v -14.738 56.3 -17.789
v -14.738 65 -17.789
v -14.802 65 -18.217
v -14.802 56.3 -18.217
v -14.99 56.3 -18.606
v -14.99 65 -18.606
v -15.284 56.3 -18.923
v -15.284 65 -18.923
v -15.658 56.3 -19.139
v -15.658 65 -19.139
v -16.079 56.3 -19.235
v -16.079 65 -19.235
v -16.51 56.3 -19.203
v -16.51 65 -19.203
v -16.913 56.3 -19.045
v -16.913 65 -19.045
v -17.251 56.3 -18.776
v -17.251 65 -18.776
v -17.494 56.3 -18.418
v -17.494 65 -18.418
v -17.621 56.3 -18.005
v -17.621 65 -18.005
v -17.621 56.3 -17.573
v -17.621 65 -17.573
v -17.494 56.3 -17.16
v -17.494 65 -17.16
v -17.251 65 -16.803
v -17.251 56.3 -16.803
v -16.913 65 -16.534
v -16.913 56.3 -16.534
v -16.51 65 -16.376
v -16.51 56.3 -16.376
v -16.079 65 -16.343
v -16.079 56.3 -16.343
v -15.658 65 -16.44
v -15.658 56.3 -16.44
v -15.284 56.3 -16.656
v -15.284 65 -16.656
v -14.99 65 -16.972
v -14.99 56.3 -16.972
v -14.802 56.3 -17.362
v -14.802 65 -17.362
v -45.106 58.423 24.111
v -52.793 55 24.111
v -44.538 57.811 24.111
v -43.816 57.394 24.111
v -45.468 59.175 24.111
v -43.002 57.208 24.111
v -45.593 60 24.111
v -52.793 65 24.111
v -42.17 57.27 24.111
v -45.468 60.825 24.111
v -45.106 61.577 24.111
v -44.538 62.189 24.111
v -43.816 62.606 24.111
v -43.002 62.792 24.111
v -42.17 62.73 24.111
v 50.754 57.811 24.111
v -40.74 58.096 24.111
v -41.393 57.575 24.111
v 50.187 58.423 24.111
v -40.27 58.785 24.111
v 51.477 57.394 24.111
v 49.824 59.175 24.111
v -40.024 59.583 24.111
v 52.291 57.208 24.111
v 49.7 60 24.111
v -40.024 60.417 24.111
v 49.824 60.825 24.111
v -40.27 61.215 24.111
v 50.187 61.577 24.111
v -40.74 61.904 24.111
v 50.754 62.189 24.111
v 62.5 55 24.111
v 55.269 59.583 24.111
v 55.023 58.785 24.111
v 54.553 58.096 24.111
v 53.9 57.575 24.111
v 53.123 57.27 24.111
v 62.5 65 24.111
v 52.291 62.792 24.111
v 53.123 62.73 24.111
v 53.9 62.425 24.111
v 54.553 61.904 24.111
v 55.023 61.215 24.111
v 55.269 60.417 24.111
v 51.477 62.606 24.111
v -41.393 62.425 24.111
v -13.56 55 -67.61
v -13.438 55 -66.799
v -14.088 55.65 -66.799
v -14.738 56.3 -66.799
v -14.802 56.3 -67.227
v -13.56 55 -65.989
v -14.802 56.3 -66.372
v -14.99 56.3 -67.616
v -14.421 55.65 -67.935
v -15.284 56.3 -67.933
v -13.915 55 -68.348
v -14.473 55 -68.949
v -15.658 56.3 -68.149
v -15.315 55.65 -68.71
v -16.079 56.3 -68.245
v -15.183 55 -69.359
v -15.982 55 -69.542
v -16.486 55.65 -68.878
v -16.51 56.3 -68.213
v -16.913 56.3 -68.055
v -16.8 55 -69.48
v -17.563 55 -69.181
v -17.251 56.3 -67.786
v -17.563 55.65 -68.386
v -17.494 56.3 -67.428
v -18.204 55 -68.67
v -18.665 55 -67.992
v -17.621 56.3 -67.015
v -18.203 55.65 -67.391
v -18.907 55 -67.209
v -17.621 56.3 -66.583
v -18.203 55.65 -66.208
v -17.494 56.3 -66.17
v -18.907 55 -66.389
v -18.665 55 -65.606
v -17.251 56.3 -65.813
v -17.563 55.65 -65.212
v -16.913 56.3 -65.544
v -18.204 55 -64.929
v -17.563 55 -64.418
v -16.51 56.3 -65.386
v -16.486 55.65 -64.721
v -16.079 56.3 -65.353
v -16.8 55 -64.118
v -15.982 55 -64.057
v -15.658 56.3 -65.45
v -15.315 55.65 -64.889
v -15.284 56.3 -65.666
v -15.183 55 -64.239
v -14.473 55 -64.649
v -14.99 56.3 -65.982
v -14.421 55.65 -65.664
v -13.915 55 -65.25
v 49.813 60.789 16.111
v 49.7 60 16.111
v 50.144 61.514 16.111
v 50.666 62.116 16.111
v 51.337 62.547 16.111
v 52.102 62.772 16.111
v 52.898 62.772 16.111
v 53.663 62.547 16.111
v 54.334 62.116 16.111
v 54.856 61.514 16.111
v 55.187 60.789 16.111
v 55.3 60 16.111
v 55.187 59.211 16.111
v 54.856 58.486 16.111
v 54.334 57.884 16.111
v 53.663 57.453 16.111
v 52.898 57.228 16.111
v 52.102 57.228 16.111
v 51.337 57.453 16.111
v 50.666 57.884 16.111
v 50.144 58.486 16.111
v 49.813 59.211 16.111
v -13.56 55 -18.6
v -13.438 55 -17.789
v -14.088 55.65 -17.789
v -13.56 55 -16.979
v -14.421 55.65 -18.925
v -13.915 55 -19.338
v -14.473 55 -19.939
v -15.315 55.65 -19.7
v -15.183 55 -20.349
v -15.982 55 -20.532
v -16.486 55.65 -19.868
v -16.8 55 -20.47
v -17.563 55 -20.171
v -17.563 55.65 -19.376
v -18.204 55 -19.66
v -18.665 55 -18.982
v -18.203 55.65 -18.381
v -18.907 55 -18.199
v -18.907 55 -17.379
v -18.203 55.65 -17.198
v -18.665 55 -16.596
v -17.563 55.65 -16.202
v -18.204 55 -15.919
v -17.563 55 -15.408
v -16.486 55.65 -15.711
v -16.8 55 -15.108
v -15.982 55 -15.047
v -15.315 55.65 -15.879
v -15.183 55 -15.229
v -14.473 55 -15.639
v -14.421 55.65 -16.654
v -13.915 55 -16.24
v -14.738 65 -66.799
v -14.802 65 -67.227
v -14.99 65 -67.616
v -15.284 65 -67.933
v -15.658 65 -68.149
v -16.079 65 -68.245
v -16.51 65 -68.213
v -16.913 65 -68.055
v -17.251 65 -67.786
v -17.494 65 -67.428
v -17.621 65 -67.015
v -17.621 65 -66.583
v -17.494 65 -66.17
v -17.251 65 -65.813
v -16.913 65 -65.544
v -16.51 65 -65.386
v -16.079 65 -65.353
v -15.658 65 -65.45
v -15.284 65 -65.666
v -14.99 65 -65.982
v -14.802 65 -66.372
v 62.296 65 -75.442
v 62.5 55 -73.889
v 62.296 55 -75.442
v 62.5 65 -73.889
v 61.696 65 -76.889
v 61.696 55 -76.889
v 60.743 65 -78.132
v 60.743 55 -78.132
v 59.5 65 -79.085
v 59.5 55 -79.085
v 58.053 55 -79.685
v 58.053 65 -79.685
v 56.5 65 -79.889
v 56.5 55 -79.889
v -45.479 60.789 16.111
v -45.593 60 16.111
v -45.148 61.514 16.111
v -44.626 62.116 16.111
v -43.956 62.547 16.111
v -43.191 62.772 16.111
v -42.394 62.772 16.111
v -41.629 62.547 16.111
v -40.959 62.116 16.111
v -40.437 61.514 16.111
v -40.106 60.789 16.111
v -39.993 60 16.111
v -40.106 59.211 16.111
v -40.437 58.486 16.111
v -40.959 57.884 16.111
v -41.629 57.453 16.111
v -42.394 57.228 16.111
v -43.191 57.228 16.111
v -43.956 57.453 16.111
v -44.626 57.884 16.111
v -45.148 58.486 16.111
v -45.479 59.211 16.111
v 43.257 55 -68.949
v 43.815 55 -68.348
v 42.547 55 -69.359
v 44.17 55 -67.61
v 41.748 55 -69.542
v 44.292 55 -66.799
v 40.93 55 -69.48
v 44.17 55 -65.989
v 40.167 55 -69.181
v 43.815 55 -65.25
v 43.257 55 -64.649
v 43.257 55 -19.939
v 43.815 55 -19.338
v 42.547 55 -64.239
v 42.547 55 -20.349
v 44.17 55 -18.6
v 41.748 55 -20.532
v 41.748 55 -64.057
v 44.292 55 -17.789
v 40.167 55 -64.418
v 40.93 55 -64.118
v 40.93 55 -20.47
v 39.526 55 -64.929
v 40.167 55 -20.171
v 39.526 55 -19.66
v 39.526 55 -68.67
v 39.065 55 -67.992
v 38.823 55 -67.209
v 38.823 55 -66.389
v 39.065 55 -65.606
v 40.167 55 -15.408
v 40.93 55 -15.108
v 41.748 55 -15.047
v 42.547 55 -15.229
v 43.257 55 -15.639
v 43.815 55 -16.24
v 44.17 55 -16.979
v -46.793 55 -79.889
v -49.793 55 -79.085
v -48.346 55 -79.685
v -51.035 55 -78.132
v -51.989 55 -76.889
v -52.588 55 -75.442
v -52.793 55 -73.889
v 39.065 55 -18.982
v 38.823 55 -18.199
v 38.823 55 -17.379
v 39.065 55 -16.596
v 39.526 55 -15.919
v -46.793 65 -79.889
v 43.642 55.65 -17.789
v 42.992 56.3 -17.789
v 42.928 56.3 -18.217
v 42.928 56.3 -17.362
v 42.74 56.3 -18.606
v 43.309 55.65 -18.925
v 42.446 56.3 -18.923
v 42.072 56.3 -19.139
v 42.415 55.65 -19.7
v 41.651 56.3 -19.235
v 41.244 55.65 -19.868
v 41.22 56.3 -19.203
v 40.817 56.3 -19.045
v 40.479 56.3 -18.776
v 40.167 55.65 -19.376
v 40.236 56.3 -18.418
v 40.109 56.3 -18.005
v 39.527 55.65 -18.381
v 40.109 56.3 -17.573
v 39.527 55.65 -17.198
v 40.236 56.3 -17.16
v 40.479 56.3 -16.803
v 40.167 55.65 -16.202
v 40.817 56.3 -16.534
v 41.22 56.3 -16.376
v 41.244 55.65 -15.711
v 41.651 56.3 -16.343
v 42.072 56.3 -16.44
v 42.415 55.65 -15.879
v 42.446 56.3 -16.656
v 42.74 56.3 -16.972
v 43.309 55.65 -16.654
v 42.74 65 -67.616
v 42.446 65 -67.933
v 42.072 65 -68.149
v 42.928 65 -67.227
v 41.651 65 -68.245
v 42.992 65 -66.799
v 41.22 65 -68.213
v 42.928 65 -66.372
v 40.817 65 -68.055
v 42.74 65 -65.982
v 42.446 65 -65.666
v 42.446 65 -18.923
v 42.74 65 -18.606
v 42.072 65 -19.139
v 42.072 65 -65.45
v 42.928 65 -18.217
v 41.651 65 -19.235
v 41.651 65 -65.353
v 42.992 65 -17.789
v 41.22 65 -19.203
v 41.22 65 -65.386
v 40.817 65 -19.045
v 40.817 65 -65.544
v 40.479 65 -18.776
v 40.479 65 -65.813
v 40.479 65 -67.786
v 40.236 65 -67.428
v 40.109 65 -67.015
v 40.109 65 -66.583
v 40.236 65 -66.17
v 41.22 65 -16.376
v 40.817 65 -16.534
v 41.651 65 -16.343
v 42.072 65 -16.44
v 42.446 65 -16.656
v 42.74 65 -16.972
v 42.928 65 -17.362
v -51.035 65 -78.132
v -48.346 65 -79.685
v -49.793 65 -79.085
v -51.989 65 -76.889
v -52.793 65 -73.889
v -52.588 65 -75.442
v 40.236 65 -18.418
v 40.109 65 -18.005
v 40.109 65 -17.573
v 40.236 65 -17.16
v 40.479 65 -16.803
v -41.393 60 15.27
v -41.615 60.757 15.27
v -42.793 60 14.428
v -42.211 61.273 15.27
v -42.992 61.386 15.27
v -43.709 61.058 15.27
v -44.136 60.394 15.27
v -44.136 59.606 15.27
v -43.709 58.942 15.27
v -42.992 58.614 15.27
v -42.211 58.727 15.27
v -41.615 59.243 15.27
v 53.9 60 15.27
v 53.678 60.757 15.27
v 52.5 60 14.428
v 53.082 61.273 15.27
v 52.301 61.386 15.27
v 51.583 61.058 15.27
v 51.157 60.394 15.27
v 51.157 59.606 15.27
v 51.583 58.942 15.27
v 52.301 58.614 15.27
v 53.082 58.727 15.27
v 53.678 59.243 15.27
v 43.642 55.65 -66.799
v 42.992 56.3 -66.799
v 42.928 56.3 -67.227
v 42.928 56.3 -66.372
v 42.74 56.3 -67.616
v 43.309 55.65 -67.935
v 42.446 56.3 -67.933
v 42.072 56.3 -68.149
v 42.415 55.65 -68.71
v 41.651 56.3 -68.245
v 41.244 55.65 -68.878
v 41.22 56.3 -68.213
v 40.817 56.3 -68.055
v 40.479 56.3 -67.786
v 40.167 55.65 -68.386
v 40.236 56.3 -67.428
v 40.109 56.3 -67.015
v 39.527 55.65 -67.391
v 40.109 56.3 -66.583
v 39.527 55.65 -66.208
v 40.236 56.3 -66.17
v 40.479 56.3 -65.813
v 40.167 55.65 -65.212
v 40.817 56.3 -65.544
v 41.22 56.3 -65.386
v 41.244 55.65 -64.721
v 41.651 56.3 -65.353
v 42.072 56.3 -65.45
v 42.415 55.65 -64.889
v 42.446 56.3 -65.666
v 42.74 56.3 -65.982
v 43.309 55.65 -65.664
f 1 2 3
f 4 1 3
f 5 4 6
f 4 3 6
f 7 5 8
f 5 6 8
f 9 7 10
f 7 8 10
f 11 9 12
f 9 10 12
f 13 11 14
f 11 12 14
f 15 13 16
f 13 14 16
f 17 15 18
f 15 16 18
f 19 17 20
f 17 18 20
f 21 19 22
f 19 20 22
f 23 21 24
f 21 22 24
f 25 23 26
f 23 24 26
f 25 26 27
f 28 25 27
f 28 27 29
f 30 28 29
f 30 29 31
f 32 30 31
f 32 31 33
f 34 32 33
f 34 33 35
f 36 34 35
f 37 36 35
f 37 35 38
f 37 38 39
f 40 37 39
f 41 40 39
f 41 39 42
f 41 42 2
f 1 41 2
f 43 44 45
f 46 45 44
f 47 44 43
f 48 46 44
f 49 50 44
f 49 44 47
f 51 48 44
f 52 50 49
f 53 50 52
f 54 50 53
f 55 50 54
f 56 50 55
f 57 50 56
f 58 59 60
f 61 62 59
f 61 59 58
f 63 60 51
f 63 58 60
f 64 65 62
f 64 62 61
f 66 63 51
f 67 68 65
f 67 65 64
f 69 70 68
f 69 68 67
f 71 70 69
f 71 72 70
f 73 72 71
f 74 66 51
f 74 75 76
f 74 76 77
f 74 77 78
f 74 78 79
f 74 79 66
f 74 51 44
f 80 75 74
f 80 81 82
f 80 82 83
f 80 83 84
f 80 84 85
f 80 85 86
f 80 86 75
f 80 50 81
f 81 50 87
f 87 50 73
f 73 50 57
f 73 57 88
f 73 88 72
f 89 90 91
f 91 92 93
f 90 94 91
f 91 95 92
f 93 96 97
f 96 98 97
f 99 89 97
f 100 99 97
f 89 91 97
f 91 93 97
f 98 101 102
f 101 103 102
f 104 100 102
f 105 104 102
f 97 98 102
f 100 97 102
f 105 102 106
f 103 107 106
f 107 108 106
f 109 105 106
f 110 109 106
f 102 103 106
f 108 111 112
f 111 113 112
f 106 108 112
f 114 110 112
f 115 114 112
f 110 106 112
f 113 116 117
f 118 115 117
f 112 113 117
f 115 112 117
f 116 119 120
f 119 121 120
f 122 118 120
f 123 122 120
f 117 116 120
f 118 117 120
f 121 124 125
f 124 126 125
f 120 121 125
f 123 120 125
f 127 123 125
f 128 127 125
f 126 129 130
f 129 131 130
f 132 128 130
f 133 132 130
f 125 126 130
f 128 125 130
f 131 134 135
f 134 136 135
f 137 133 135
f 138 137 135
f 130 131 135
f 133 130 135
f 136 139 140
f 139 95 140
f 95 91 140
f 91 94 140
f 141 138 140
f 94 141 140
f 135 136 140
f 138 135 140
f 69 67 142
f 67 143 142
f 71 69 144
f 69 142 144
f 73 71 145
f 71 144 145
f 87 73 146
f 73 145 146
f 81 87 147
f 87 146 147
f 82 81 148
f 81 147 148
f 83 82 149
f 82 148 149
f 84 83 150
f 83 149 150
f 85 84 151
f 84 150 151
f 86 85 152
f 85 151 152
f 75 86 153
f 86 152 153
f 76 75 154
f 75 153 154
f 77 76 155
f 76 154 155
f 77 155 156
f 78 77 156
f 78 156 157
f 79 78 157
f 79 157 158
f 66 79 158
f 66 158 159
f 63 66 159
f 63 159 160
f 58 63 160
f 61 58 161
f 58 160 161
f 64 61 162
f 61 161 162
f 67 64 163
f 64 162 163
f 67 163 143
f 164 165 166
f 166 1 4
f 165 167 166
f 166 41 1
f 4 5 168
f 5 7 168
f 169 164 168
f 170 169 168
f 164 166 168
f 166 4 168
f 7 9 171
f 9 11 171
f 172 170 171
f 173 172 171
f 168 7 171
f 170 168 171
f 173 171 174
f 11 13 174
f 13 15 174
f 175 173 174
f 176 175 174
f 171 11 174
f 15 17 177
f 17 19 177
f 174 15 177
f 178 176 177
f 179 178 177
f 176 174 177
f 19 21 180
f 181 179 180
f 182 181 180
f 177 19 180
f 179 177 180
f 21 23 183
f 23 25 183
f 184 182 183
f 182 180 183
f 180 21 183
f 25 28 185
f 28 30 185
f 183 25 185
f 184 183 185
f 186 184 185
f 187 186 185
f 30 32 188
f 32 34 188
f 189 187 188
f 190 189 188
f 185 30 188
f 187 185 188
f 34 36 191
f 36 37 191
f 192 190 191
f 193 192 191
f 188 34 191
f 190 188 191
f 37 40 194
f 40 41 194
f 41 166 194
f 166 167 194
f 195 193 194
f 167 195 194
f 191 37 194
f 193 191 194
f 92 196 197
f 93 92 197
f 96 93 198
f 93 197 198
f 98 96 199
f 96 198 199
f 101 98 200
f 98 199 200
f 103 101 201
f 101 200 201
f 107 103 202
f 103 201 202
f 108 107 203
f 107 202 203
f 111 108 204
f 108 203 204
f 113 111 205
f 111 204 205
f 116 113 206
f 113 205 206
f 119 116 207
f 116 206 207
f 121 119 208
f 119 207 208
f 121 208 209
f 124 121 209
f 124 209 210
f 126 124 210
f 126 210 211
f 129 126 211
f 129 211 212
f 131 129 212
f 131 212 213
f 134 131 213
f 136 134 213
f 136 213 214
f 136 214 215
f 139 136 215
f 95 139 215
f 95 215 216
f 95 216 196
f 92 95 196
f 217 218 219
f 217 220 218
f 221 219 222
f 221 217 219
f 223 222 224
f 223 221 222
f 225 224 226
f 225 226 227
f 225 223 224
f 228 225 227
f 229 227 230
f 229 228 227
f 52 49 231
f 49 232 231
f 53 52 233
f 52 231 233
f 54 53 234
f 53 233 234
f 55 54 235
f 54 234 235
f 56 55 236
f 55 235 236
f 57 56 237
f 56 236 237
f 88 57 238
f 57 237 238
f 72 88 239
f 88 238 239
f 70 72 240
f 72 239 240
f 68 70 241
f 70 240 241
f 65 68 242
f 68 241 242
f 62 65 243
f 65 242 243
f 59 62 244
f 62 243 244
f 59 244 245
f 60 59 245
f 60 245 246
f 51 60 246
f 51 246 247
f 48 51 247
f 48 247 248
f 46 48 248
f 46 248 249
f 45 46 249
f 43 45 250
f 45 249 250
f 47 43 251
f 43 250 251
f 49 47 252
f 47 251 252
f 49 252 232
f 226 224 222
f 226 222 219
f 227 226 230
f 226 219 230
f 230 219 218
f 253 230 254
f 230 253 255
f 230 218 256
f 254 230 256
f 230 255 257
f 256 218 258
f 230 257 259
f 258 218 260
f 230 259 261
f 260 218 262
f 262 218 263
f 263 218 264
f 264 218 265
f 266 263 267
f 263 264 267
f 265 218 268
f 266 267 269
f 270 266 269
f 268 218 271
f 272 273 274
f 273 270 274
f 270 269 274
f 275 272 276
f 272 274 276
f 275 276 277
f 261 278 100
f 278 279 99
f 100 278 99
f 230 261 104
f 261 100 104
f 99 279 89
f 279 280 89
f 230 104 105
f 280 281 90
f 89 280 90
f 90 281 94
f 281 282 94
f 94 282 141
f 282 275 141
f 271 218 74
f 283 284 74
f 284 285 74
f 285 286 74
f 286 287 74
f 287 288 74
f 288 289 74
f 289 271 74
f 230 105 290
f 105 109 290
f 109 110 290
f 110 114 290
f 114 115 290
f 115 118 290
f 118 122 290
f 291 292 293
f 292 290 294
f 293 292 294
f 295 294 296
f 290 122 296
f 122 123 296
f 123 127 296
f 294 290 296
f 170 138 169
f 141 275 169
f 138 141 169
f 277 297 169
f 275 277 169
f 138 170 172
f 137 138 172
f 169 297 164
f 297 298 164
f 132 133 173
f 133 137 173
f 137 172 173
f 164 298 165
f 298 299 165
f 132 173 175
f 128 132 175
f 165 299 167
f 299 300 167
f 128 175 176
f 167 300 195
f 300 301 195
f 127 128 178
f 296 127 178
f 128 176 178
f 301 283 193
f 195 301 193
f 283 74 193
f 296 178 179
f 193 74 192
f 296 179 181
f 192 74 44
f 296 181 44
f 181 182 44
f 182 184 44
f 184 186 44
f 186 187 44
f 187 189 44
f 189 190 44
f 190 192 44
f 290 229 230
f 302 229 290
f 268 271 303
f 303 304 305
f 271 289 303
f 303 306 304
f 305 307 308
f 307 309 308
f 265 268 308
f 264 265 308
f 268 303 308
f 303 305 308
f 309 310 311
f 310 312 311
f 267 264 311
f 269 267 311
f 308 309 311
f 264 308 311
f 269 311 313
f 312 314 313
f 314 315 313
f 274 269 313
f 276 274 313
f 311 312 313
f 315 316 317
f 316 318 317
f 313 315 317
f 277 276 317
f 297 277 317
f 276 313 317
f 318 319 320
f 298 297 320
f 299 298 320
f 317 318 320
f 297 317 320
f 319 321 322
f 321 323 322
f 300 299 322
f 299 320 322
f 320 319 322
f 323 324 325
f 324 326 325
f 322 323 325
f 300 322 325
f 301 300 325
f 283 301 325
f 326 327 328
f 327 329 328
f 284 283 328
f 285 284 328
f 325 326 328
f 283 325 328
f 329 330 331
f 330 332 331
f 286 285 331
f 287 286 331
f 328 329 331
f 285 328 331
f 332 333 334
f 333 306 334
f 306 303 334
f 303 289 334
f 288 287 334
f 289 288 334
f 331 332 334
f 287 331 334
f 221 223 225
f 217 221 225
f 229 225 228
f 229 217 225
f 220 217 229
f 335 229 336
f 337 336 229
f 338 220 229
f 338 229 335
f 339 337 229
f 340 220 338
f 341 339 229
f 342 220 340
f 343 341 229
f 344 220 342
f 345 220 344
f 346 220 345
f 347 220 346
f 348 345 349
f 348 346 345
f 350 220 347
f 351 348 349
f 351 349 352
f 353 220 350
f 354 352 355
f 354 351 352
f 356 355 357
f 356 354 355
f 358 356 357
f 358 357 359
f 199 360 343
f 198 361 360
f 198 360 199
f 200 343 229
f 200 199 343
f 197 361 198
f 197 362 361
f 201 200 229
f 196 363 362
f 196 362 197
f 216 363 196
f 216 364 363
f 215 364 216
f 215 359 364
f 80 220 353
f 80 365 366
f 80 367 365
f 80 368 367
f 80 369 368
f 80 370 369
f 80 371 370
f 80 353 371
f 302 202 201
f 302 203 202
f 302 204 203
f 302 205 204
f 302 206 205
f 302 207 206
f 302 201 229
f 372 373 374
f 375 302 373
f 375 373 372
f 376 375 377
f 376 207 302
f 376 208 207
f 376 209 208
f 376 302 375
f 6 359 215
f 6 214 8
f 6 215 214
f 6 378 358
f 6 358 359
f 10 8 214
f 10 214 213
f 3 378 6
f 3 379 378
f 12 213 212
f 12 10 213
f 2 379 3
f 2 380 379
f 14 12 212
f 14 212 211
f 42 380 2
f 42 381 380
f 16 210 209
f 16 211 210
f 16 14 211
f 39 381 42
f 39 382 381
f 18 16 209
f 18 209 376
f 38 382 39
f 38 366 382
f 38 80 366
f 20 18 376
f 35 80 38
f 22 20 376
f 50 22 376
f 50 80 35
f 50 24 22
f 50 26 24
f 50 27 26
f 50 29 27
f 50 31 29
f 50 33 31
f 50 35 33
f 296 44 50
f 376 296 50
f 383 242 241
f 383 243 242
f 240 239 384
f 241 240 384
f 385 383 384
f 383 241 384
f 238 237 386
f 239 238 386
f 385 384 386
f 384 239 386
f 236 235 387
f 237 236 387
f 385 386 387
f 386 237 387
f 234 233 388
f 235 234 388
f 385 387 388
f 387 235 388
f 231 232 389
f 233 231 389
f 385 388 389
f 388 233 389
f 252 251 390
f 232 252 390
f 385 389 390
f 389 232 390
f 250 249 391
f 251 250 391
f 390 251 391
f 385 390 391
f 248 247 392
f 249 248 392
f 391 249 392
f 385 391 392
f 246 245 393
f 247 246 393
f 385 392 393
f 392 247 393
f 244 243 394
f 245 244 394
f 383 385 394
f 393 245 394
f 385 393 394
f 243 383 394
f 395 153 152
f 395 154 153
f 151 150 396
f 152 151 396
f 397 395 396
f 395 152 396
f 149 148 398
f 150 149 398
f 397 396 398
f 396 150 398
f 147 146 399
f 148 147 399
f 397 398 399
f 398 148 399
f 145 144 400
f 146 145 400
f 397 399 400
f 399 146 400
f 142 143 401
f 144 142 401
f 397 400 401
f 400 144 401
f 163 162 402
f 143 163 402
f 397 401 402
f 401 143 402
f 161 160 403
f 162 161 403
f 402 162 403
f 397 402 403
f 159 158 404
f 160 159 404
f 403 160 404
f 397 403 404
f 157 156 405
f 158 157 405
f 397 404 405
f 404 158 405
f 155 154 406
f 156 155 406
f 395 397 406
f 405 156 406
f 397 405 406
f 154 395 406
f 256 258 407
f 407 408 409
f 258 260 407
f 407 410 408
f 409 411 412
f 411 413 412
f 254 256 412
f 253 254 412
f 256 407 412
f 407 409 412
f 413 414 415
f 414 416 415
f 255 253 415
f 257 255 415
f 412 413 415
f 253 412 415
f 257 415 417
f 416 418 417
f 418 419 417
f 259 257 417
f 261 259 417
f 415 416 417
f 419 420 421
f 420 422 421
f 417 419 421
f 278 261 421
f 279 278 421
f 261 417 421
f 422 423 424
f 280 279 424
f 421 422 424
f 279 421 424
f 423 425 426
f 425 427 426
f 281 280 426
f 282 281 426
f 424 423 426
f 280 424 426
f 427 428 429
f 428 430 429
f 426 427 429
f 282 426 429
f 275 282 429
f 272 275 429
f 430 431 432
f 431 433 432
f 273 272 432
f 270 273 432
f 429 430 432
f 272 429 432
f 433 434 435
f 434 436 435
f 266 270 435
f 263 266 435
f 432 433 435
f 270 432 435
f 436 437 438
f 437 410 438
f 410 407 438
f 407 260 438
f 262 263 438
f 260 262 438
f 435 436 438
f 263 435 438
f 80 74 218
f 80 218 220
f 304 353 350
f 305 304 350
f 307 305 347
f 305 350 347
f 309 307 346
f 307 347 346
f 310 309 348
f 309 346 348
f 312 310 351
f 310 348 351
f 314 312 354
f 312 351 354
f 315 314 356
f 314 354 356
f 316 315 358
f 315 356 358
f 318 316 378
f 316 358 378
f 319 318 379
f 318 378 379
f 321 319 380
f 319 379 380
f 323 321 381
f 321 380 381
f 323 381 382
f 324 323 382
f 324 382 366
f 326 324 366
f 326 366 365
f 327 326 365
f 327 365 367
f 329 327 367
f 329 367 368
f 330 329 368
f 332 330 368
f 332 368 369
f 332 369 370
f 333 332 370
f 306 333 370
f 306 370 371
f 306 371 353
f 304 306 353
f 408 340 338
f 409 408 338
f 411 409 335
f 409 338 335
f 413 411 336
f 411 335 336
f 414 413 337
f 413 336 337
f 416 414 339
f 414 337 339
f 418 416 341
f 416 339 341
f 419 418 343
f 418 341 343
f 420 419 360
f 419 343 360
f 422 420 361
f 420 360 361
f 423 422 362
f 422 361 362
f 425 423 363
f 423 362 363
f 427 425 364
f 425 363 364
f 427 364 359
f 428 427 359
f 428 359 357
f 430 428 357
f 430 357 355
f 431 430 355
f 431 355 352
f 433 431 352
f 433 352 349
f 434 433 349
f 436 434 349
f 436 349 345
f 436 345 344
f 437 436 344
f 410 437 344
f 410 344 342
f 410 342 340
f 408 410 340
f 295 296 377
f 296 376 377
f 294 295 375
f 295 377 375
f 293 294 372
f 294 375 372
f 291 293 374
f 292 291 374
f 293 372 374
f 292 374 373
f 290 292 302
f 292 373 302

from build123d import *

# Parameters (mm, degrees)
SKETCH2_W                                         = 115.292618629
SKETCH2_H                                         = 134.000000002
BOSS_EXTRUDE2_DEPTH                               = 8
FILLET2_R                                         = 6
SKETCH19_W                                        = 8
SKETCH19_H                                        = 99
BOSS_EXTRUDE3_DEPTH                               = 115.292618629
SKETCH21_W                                        = 135.292618629
SKETCH21_H                                        = 129
SKETCH21_W_2                                      = 115.292618629
SKETCH21_H_2                                      = 99
BOSS_EXTRUDE4_DEPTH                               = 8
FILLET3_R                                         = 5
CUT_EXTRUDE1_DEPTH                                = 4
SKETCH24_W                                        = 115.292618629
SKETCH24_H                                        = 10
BOSS_EXTRUDE5_DEPTH                               = 104
FILLET4_R                                         = 6
CSK_FOR_M2_5_FLAT_HEAD_MACHINE_SCREW2_D           = 2.9
CSK_FOR_M2_5_FLAT_HEAD_MACHINE_SCREW2_DEPTH       = 10
CSK_FOR_M2_5_FLAT_HEAD_MACHINE_SCREW2_CSINK_D     = 5.5
CSK_FOR_M2_5_FLAT_HEAD_MACHINE_SCREW2_CSINK_ANGLE = 90
SKETCH49_R                                        = 4.43
CUT_EXTRUDE3_DEPTH                                = 8
M2_5_CLEARANCE_HOLE1_D                            = 2.9
CUT_EXTRUDE4_START                                = -8
CUT_EXTRUDE4_DEPTH                                = 8
CHAMFER1_SIZE                                     = 0.9
SKETCH62_W                                        = 134.000000002
SKETCH62_H                                        = 8
CUT_EXTRUDE5_DEPTH                                = 115.292618629
SKETCH63_W                                        = 135.292618629
SKETCH63_H                                        = 8
CUT_EXTRUDE6_DEPTH                                = 129
F_5_6_5_6_DIAMETER_HOLE1_D                        = 5.6
F_5_6_5_6_DIAMETER_HOLE1_DEPTH                    = 8
F_5_6_5_6_DIAMETER_HOLE1_TIP                      = 1.682409733


with BuildPart() as part:
    # Sketch2 → Boss-Extrude2 (new body)
    with BuildSketch(Plane(origin=(0, 0, 0), x_dir=(1, 0, 0), z_dir=(0, 1, 0))):
        with Locations((4.853690686, 42.889279439)):
            Rectangle(SKETCH2_W, SKETCH2_H)
    extrude(amount=BOSS_EXTRUDE2_DEPTH)

    # Fillet2
    fillet2_edges = [part.edges().sort_by_distance(p)[0] for p in [
        (-52.792618629, 4, -109.88927944),
        (62.5, 4, -109.88927944),
    ]]
    fillet(fillet2_edges, radius=FILLET2_R)

    # Sketch19 → Boss-Extrude3 (add)
    with BuildSketch(Plane.ZY.offset(52.792618629)):
        with Locations((28.110720562, 13.5)):
            Rectangle(SKETCH19_W, SKETCH19_H)
    extrude(amount=-BOSS_EXTRUDE3_DEPTH)

    # Sketch21 → Boss-Extrude4 (add)
    with BuildSketch(Plane.XY.offset(32.110720562)):
        with Locations((4.853690685, 8.5)):
            Rectangle(SKETCH21_W, SKETCH21_H)
        with Locations((4.853690686, 13.5)):
            Rectangle(SKETCH21_W_2, SKETCH21_H_2, mode=Mode.SUBTRACT)
    extrude(amount=-BOSS_EXTRUDE4_DEPTH)

    # Fillet3
    fillet3_edges = [part.edges().sort_by_distance(p)[0] for p in [
        (72.5, 73, 28.110720562),
        (72.5, -56, 28.110720562),
        (-62.792618629, -56, 28.110720562),
        (-62.792618629, 73, 28.110720562),
    ]]
    fillet(fillet3_edges, radius=FILLET3_R)

    # Sketch22 → Cut-Extrude1 (cut)
    with BuildSketch(Plane(origin=(0, 0, 24.110720562), x_dir=(-1, 0, 0), z_dir=(0, 0, -1))):
        with BuildLine():
            Line((62.792618629, -51), (62.792618629, 68))
            ThreePointArc((62.792618629, 68), (61.328152535, 71.535533906), (57.792618629, 73))
            Line((57.792618629, 73), (-67.5, 73))
            ThreePointArc((-67.5, 73), (-71.035533906, 71.535533906), (-72.5, 68))
            Line((-72.5, 68), (-72.5, -51))
            ThreePointArc((-72.5, -51), (-71.035533906, -54.535533906), (-67.5, -56))
            Line((-67.5, -56), (57.792618629, -56))
            ThreePointArc((57.792618629, -56), (61.328152535, -54.535533906), (62.792618629, -51))
        make_face()
        with BuildLine():
            Line((57.792618629, 69.75), (-67.5, 69.75))
            ThreePointArc((-67.5, 69.75), (-68.737436867, 69.237436867), (-69.25, 68))
            Line((-69.25, 68), (-69.25, -51))
            ThreePointArc((-69.25, -51), (-68.737436867, -52.237436867), (-67.5, -52.75))
            Line((-67.5, -52.75), (57.792618629, -52.75))
            ThreePointArc((57.792618629, -52.75), (59.030055496, -52.237436867), (59.542618629, -51))
            Line((59.542618629, -51), (59.542618629, 68))
            ThreePointArc((59.542618629, 68), (59.030055496, 69.237436867), (57.792618629, 69.75))
        make_face(mode=Mode.SUBTRACT)
    extrude(amount=-CUT_EXTRUDE1_DEPTH, mode=Mode.SUBTRACT)

    # Sketch24 → Boss-Extrude5 (add)
    with BuildSketch(Plane(origin=(0, 0, 24.110720562), x_dir=(-1, 0, 0), z_dir=(0, 0, -1))):
        with Locations((-4.853690686, 60)):
            Rectangle(SKETCH24_W, SKETCH24_H)
    extrude(amount=BOSS_EXTRUDE5_DEPTH)

    # Fillet4
    fillet4_edges = [part.edges().sort_by_distance(p)[0] for p in [
        (62.5, 60, -79.889279438),
        (-52.792618629, 60, -79.889279438),
    ]]
    fillet(fillet4_edges, radius=FILLET4_R)

    # CSK for M2.5 Flat Head Machine Screw2
    with Locations(Plane(origin=(0, 55, 0), x_dir=(-1, 0, 0), z_dir=(0, -1, 0))):
        with Locations((16.187618629, 66.799279438), (-41.542381371, 66.799279438), (16.187618629, 17.789279438), (-41.542381371, 17.789279438)):
            CounterSinkHole(CSK_FOR_M2_5_FLAT_HEAD_MACHINE_SCREW2_D / 2, CSK_FOR_M2_5_FLAT_HEAD_MACHINE_SCREW2_CSINK_D / 2, depth=CSK_FOR_M2_5_FLAT_HEAD_MACHINE_SCREW2_DEPTH, counter_sink_angle=CSK_FOR_M2_5_FLAT_HEAD_MACHINE_SCREW2_CSINK_ANGLE)

    # Sketch49 → Cut-Extrude3 (cut)
    with BuildSketch(Plane.XY.offset(32.110720562)):
        with Locations((4.853690685, 40.159632183)):
            Circle(SKETCH49_R)
    extrude(amount=-CUT_EXTRUDE3_DEPTH, mode=Mode.SUBTRACT)

    # M2.5 Clearance Hole1 (through all)
    with Locations(Plane(origin=(0, 8, 0), x_dir=(1, 0, 0), z_dir=(0, 1, 0))):
        with Locations((-28.27, 101.64), (-7.29, 101.64), (-7.29, 88.14), (-28.27, 88.14)):
            Hole(M2_5_CLEARANCE_HOLE1_D / 2)

    # Sketch60 → Cut-Extrude4 (cut)
    with BuildSketch(Plane(origin=(0, 8, 0), x_dir=(1, 0, 0), z_dir=(0, 1, 0)).offset(CUT_EXTRUDE4_START)):
        with BuildLine():
            Line((-30.27, 103.09), (-26.27, 103.09))
            ThreePointArc((-26.27, 103.09), (-24.82, 101.64), (-26.27, 100.19))
            Line((-26.27, 100.19), (-30.27, 100.19))
            ThreePointArc((-30.27, 100.19), (-31.72, 101.64), (-30.27, 103.09))
        make_face()
        with BuildLine():
            Line((-9.29, 103.09), (-5.29, 103.09))
            ThreePointArc((-5.29, 103.09), (-3.84, 101.64), (-5.29, 100.19))
            Line((-5.29, 100.19), (-9.29, 100.19))
            ThreePointArc((-9.29, 100.19), (-10.74, 101.64), (-9.29, 103.09))
        make_face()
        with BuildLine():
            Line((-30.27, 89.59), (-26.27, 89.59))
            ThreePointArc((-26.27, 89.59), (-24.82, 88.14), (-26.27, 86.69))
            Line((-26.27, 86.69), (-30.27, 86.69))
            ThreePointArc((-30.27, 86.69), (-31.72, 88.14), (-30.27, 89.59))
        make_face()
        with BuildLine():
            Line((-9.29, 89.59), (-5.29, 89.59))
            ThreePointArc((-5.29, 89.59), (-3.84, 88.14), (-5.29, 86.69))
            Line((-5.29, 86.69), (-9.29, 86.69))
            ThreePointArc((-9.29, 86.69), (-10.74, 88.14), (-9.29, 89.59))
        make_face()
    extrude(amount=CUT_EXTRUDE4_DEPTH, mode=Mode.SUBTRACT)

    # Chamfer1
    chamfer1_edges = [part.edges().sort_by_distance(p)[0] for p in [
        (-7.29, 8, -100.19),
        (-3.84, 8, -101.64),
        (-7.29, 8, -103.09),
        (-28.27, 8, -86.69),
        (-24.82, 8, -88.14),
        (-28.27, 8, -89.59),
        (-7.29, 8, -86.69),
        (-3.84, 8, -88.14),
        (-7.29, 8, -89.59),
        (-28.27, 8, -103.09),
        (-31.72, 8, -101.64),
        (-28.27, 8, -100.19),
        (-24.82, 8, -101.64),
        (-10.74, 8, -88.14),
        (-31.72, 8, -88.14),
        (-10.74, 8, -101.64),
    ]]
    chamfer(chamfer1_edges, length=CHAMFER1_SIZE)

    # Sketch62 → Cut-Extrude5 (cut)
    with BuildSketch(Plane.ZY.offset(52.792618629)):
        with Locations((-42.889279439, 4)):
            Rectangle(SKETCH62_W, SKETCH62_H)
    extrude(amount=-CUT_EXTRUDE5_DEPTH, mode=Mode.SUBTRACT)

    # Sketch63 → Cut-Extrude6 (cut)
    with BuildSketch(Plane(origin=(0, 73, 0), x_dir=(1, 0, 0), z_dir=(0, 1, 0))):
        with Locations((4.853690685, -28.110720562)):
            Rectangle(SKETCH63_W, SKETCH63_H)
    extrude(amount=-CUT_EXTRUDE6_DEPTH, mode=Mode.SUBTRACT)

    # Ø5.6 (5.6) Diameter Hole1
    with Locations(Plane.XY.offset(24.110720562)):
        with Locations((-42.792618629, 60), (52.5, 60)):
            Hole(F_5_6_5_6_DIAMETER_HOLE1_D / 2, depth=F_5_6_5_6_DIAMETER_HOLE1_DEPTH)
            with Locations((0, 0, -(F_5_6_5_6_DIAMETER_HOLE1_DEPTH + F_5_6_5_6_DIAMETER_HOLE1_TIP / 2))):  # 118° drill point
                Cone(0, F_5_6_5_6_DIAMETER_HOLE1_D / 2, F_5_6_5_6_DIAMETER_HOLE1_TIP, mode=Mode.SUBTRACT)


solid = part.part
